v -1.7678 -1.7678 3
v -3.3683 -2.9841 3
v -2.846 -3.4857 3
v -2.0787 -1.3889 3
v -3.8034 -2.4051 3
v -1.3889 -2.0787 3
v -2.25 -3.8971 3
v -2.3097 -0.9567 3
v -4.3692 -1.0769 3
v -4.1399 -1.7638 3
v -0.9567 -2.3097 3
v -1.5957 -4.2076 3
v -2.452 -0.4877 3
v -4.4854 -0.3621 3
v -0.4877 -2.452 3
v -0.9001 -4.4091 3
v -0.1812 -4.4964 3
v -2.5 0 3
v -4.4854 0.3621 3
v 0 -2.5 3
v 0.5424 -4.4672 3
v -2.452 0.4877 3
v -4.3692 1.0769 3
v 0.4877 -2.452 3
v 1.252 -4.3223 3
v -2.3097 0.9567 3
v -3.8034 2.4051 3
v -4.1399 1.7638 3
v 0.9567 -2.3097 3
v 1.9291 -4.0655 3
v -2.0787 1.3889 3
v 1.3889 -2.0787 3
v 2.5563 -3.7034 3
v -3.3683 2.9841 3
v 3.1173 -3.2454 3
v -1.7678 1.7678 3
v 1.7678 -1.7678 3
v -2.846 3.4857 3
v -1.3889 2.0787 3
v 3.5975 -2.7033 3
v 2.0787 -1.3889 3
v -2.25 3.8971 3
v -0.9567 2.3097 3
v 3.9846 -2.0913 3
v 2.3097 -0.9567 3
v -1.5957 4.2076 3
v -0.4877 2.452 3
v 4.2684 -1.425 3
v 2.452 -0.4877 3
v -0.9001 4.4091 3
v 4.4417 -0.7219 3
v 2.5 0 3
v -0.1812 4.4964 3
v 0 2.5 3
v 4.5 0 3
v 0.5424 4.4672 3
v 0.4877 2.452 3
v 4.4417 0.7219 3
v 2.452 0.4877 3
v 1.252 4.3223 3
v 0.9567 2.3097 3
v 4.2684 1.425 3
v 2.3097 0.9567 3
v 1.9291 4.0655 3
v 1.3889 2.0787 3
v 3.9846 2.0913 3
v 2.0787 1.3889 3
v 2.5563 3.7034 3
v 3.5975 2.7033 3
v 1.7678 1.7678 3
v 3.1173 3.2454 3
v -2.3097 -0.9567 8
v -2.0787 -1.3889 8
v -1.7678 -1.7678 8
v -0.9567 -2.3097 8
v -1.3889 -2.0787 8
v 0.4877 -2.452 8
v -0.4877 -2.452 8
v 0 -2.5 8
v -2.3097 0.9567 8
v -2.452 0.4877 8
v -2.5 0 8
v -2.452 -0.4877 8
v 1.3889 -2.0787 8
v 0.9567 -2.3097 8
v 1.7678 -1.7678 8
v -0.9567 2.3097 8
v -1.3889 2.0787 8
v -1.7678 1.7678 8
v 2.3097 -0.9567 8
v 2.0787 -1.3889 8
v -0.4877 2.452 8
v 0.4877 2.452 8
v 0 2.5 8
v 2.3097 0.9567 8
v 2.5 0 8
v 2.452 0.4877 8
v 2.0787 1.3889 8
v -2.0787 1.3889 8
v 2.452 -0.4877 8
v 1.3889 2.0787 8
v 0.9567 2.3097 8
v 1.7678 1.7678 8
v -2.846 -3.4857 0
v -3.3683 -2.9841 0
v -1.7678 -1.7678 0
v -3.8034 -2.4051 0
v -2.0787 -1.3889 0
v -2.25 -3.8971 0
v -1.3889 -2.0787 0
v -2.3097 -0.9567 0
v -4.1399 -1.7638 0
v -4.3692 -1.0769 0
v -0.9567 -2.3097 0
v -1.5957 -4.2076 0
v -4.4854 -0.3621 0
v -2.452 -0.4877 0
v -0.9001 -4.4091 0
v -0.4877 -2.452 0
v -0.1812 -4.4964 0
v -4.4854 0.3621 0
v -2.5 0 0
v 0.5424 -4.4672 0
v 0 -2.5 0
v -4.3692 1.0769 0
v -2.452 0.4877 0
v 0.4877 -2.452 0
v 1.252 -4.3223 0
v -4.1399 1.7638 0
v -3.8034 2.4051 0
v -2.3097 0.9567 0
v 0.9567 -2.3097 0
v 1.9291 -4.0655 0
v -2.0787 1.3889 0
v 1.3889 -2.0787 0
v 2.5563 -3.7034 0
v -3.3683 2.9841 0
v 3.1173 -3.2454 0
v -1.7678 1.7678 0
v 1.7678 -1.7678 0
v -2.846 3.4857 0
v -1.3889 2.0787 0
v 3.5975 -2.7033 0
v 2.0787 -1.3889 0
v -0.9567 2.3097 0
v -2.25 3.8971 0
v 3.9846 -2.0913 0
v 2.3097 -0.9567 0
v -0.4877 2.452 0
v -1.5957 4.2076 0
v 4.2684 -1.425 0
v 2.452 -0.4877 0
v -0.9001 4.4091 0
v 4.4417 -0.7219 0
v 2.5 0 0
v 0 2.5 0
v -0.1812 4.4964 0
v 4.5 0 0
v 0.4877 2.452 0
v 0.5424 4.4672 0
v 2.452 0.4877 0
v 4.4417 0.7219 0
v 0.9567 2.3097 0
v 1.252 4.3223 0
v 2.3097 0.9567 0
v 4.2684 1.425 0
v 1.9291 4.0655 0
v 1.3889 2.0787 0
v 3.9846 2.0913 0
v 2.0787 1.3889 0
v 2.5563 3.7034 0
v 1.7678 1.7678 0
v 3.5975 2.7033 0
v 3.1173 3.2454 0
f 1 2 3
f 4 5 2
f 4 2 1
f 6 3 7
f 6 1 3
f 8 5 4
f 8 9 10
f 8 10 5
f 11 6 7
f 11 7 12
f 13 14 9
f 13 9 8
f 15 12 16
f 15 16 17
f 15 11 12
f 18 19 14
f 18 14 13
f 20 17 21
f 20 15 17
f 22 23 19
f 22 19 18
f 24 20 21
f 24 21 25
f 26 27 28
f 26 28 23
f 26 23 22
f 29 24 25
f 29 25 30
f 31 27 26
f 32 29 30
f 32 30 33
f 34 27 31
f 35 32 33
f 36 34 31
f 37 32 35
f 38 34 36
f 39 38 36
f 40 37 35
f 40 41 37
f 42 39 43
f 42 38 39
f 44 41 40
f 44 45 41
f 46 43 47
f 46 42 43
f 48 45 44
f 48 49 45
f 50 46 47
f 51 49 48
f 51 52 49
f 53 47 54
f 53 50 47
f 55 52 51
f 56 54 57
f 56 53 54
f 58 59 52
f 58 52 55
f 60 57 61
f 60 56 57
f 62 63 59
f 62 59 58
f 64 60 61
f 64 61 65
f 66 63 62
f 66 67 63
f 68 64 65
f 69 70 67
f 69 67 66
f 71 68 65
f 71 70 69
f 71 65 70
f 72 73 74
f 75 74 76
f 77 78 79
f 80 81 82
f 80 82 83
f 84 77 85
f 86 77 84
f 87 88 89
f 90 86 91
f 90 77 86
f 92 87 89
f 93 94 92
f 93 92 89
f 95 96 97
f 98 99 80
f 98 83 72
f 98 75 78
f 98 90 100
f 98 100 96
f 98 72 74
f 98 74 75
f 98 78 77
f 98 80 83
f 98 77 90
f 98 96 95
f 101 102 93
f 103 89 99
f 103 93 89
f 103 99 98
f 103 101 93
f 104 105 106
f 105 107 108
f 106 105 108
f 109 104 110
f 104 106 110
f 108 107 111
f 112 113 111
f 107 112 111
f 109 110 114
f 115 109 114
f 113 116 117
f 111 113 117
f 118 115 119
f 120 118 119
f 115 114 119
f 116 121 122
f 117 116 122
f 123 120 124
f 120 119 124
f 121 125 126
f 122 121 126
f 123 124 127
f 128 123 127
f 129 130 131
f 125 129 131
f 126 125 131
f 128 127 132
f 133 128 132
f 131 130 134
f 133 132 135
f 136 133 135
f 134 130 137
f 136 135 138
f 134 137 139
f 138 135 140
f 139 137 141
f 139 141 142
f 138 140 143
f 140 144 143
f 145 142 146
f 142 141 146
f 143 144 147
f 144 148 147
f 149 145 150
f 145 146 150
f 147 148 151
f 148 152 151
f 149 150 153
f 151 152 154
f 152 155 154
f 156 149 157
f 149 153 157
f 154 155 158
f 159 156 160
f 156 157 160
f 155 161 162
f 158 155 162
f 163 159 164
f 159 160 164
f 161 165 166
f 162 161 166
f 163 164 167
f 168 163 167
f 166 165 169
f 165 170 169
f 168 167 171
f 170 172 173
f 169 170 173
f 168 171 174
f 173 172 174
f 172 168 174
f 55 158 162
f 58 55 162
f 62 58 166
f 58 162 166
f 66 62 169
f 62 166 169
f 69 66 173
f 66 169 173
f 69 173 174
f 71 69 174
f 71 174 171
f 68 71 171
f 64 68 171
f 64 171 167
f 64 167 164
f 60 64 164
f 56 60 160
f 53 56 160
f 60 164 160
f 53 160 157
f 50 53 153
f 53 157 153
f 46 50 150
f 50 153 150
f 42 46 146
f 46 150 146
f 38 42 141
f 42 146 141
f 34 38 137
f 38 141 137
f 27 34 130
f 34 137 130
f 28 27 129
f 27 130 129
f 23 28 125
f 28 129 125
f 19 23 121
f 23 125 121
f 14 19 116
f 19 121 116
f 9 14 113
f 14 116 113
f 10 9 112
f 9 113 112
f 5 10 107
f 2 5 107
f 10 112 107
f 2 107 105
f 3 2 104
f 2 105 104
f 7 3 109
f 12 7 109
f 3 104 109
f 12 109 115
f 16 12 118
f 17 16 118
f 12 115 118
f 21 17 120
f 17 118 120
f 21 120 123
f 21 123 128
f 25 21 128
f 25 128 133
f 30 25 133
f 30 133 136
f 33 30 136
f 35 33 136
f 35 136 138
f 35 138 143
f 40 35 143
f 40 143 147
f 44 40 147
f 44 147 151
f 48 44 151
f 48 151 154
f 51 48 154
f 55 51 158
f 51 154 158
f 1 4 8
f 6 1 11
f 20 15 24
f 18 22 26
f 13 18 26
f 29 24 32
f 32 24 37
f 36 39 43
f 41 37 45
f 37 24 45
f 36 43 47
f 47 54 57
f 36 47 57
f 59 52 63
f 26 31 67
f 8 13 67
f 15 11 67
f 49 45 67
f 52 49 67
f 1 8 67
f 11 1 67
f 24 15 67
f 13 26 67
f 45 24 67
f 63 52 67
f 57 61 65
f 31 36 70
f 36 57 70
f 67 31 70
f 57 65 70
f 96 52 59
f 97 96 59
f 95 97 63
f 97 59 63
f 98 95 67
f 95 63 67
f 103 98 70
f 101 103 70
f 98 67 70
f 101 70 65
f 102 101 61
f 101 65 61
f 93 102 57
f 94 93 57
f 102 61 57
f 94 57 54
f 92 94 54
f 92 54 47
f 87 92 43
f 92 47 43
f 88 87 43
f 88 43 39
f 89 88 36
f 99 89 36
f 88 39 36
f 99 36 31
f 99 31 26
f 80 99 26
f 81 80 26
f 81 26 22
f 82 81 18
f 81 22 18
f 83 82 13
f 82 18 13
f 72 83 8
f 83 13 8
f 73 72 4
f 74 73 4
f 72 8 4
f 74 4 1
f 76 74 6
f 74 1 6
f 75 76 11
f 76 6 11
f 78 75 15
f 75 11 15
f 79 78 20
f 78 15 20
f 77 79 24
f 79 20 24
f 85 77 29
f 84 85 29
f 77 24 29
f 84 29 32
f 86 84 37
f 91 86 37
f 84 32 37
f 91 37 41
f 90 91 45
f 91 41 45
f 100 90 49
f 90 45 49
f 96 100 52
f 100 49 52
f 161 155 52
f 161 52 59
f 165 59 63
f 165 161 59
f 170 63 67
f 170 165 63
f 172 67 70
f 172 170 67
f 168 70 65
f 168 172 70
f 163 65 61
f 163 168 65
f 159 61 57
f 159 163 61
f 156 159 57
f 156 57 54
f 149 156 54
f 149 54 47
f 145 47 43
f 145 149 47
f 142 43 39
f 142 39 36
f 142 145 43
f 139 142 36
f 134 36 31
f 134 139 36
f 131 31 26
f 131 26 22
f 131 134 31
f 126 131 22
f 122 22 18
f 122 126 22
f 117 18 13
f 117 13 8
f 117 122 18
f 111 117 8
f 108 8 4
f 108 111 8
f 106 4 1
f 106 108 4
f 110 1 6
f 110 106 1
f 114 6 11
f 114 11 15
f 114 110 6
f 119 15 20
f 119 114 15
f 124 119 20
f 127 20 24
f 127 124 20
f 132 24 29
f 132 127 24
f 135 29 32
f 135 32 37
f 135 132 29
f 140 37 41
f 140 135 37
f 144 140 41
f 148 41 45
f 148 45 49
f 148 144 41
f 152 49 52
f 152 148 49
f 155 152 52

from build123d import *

# Parameters (mm, degrees)
SKETCH2_R           = 4.5
SKETCH2_R_2         = 2.5
BOSS_EXTRUDE1_DEPTH = 3
SKETCH3_R           = 2.5
BOSS_EXTRUDE2_DEPTH = 5


with BuildPart() as part:
    # Sketch2 → Boss-Extrude1 (new body)
    with BuildSketch(Plane.XY):
        Circle(SKETCH2_R)
        Circle(SKETCH2_R_2, mode=Mode.SUBTRACT)
    extrude(amount=BOSS_EXTRUDE1_DEPTH)


with BuildPart() as body_2:
    # Sketch3 → Boss-Extrude2 (new body)
    with BuildSketch(Plane.XY.offset(3)):
        Circle(SKETCH3_R)
    extrude(amount=BOSS_EXTRUDE2_DEPTH)


solid = Compound([part.part, body_2.part])
